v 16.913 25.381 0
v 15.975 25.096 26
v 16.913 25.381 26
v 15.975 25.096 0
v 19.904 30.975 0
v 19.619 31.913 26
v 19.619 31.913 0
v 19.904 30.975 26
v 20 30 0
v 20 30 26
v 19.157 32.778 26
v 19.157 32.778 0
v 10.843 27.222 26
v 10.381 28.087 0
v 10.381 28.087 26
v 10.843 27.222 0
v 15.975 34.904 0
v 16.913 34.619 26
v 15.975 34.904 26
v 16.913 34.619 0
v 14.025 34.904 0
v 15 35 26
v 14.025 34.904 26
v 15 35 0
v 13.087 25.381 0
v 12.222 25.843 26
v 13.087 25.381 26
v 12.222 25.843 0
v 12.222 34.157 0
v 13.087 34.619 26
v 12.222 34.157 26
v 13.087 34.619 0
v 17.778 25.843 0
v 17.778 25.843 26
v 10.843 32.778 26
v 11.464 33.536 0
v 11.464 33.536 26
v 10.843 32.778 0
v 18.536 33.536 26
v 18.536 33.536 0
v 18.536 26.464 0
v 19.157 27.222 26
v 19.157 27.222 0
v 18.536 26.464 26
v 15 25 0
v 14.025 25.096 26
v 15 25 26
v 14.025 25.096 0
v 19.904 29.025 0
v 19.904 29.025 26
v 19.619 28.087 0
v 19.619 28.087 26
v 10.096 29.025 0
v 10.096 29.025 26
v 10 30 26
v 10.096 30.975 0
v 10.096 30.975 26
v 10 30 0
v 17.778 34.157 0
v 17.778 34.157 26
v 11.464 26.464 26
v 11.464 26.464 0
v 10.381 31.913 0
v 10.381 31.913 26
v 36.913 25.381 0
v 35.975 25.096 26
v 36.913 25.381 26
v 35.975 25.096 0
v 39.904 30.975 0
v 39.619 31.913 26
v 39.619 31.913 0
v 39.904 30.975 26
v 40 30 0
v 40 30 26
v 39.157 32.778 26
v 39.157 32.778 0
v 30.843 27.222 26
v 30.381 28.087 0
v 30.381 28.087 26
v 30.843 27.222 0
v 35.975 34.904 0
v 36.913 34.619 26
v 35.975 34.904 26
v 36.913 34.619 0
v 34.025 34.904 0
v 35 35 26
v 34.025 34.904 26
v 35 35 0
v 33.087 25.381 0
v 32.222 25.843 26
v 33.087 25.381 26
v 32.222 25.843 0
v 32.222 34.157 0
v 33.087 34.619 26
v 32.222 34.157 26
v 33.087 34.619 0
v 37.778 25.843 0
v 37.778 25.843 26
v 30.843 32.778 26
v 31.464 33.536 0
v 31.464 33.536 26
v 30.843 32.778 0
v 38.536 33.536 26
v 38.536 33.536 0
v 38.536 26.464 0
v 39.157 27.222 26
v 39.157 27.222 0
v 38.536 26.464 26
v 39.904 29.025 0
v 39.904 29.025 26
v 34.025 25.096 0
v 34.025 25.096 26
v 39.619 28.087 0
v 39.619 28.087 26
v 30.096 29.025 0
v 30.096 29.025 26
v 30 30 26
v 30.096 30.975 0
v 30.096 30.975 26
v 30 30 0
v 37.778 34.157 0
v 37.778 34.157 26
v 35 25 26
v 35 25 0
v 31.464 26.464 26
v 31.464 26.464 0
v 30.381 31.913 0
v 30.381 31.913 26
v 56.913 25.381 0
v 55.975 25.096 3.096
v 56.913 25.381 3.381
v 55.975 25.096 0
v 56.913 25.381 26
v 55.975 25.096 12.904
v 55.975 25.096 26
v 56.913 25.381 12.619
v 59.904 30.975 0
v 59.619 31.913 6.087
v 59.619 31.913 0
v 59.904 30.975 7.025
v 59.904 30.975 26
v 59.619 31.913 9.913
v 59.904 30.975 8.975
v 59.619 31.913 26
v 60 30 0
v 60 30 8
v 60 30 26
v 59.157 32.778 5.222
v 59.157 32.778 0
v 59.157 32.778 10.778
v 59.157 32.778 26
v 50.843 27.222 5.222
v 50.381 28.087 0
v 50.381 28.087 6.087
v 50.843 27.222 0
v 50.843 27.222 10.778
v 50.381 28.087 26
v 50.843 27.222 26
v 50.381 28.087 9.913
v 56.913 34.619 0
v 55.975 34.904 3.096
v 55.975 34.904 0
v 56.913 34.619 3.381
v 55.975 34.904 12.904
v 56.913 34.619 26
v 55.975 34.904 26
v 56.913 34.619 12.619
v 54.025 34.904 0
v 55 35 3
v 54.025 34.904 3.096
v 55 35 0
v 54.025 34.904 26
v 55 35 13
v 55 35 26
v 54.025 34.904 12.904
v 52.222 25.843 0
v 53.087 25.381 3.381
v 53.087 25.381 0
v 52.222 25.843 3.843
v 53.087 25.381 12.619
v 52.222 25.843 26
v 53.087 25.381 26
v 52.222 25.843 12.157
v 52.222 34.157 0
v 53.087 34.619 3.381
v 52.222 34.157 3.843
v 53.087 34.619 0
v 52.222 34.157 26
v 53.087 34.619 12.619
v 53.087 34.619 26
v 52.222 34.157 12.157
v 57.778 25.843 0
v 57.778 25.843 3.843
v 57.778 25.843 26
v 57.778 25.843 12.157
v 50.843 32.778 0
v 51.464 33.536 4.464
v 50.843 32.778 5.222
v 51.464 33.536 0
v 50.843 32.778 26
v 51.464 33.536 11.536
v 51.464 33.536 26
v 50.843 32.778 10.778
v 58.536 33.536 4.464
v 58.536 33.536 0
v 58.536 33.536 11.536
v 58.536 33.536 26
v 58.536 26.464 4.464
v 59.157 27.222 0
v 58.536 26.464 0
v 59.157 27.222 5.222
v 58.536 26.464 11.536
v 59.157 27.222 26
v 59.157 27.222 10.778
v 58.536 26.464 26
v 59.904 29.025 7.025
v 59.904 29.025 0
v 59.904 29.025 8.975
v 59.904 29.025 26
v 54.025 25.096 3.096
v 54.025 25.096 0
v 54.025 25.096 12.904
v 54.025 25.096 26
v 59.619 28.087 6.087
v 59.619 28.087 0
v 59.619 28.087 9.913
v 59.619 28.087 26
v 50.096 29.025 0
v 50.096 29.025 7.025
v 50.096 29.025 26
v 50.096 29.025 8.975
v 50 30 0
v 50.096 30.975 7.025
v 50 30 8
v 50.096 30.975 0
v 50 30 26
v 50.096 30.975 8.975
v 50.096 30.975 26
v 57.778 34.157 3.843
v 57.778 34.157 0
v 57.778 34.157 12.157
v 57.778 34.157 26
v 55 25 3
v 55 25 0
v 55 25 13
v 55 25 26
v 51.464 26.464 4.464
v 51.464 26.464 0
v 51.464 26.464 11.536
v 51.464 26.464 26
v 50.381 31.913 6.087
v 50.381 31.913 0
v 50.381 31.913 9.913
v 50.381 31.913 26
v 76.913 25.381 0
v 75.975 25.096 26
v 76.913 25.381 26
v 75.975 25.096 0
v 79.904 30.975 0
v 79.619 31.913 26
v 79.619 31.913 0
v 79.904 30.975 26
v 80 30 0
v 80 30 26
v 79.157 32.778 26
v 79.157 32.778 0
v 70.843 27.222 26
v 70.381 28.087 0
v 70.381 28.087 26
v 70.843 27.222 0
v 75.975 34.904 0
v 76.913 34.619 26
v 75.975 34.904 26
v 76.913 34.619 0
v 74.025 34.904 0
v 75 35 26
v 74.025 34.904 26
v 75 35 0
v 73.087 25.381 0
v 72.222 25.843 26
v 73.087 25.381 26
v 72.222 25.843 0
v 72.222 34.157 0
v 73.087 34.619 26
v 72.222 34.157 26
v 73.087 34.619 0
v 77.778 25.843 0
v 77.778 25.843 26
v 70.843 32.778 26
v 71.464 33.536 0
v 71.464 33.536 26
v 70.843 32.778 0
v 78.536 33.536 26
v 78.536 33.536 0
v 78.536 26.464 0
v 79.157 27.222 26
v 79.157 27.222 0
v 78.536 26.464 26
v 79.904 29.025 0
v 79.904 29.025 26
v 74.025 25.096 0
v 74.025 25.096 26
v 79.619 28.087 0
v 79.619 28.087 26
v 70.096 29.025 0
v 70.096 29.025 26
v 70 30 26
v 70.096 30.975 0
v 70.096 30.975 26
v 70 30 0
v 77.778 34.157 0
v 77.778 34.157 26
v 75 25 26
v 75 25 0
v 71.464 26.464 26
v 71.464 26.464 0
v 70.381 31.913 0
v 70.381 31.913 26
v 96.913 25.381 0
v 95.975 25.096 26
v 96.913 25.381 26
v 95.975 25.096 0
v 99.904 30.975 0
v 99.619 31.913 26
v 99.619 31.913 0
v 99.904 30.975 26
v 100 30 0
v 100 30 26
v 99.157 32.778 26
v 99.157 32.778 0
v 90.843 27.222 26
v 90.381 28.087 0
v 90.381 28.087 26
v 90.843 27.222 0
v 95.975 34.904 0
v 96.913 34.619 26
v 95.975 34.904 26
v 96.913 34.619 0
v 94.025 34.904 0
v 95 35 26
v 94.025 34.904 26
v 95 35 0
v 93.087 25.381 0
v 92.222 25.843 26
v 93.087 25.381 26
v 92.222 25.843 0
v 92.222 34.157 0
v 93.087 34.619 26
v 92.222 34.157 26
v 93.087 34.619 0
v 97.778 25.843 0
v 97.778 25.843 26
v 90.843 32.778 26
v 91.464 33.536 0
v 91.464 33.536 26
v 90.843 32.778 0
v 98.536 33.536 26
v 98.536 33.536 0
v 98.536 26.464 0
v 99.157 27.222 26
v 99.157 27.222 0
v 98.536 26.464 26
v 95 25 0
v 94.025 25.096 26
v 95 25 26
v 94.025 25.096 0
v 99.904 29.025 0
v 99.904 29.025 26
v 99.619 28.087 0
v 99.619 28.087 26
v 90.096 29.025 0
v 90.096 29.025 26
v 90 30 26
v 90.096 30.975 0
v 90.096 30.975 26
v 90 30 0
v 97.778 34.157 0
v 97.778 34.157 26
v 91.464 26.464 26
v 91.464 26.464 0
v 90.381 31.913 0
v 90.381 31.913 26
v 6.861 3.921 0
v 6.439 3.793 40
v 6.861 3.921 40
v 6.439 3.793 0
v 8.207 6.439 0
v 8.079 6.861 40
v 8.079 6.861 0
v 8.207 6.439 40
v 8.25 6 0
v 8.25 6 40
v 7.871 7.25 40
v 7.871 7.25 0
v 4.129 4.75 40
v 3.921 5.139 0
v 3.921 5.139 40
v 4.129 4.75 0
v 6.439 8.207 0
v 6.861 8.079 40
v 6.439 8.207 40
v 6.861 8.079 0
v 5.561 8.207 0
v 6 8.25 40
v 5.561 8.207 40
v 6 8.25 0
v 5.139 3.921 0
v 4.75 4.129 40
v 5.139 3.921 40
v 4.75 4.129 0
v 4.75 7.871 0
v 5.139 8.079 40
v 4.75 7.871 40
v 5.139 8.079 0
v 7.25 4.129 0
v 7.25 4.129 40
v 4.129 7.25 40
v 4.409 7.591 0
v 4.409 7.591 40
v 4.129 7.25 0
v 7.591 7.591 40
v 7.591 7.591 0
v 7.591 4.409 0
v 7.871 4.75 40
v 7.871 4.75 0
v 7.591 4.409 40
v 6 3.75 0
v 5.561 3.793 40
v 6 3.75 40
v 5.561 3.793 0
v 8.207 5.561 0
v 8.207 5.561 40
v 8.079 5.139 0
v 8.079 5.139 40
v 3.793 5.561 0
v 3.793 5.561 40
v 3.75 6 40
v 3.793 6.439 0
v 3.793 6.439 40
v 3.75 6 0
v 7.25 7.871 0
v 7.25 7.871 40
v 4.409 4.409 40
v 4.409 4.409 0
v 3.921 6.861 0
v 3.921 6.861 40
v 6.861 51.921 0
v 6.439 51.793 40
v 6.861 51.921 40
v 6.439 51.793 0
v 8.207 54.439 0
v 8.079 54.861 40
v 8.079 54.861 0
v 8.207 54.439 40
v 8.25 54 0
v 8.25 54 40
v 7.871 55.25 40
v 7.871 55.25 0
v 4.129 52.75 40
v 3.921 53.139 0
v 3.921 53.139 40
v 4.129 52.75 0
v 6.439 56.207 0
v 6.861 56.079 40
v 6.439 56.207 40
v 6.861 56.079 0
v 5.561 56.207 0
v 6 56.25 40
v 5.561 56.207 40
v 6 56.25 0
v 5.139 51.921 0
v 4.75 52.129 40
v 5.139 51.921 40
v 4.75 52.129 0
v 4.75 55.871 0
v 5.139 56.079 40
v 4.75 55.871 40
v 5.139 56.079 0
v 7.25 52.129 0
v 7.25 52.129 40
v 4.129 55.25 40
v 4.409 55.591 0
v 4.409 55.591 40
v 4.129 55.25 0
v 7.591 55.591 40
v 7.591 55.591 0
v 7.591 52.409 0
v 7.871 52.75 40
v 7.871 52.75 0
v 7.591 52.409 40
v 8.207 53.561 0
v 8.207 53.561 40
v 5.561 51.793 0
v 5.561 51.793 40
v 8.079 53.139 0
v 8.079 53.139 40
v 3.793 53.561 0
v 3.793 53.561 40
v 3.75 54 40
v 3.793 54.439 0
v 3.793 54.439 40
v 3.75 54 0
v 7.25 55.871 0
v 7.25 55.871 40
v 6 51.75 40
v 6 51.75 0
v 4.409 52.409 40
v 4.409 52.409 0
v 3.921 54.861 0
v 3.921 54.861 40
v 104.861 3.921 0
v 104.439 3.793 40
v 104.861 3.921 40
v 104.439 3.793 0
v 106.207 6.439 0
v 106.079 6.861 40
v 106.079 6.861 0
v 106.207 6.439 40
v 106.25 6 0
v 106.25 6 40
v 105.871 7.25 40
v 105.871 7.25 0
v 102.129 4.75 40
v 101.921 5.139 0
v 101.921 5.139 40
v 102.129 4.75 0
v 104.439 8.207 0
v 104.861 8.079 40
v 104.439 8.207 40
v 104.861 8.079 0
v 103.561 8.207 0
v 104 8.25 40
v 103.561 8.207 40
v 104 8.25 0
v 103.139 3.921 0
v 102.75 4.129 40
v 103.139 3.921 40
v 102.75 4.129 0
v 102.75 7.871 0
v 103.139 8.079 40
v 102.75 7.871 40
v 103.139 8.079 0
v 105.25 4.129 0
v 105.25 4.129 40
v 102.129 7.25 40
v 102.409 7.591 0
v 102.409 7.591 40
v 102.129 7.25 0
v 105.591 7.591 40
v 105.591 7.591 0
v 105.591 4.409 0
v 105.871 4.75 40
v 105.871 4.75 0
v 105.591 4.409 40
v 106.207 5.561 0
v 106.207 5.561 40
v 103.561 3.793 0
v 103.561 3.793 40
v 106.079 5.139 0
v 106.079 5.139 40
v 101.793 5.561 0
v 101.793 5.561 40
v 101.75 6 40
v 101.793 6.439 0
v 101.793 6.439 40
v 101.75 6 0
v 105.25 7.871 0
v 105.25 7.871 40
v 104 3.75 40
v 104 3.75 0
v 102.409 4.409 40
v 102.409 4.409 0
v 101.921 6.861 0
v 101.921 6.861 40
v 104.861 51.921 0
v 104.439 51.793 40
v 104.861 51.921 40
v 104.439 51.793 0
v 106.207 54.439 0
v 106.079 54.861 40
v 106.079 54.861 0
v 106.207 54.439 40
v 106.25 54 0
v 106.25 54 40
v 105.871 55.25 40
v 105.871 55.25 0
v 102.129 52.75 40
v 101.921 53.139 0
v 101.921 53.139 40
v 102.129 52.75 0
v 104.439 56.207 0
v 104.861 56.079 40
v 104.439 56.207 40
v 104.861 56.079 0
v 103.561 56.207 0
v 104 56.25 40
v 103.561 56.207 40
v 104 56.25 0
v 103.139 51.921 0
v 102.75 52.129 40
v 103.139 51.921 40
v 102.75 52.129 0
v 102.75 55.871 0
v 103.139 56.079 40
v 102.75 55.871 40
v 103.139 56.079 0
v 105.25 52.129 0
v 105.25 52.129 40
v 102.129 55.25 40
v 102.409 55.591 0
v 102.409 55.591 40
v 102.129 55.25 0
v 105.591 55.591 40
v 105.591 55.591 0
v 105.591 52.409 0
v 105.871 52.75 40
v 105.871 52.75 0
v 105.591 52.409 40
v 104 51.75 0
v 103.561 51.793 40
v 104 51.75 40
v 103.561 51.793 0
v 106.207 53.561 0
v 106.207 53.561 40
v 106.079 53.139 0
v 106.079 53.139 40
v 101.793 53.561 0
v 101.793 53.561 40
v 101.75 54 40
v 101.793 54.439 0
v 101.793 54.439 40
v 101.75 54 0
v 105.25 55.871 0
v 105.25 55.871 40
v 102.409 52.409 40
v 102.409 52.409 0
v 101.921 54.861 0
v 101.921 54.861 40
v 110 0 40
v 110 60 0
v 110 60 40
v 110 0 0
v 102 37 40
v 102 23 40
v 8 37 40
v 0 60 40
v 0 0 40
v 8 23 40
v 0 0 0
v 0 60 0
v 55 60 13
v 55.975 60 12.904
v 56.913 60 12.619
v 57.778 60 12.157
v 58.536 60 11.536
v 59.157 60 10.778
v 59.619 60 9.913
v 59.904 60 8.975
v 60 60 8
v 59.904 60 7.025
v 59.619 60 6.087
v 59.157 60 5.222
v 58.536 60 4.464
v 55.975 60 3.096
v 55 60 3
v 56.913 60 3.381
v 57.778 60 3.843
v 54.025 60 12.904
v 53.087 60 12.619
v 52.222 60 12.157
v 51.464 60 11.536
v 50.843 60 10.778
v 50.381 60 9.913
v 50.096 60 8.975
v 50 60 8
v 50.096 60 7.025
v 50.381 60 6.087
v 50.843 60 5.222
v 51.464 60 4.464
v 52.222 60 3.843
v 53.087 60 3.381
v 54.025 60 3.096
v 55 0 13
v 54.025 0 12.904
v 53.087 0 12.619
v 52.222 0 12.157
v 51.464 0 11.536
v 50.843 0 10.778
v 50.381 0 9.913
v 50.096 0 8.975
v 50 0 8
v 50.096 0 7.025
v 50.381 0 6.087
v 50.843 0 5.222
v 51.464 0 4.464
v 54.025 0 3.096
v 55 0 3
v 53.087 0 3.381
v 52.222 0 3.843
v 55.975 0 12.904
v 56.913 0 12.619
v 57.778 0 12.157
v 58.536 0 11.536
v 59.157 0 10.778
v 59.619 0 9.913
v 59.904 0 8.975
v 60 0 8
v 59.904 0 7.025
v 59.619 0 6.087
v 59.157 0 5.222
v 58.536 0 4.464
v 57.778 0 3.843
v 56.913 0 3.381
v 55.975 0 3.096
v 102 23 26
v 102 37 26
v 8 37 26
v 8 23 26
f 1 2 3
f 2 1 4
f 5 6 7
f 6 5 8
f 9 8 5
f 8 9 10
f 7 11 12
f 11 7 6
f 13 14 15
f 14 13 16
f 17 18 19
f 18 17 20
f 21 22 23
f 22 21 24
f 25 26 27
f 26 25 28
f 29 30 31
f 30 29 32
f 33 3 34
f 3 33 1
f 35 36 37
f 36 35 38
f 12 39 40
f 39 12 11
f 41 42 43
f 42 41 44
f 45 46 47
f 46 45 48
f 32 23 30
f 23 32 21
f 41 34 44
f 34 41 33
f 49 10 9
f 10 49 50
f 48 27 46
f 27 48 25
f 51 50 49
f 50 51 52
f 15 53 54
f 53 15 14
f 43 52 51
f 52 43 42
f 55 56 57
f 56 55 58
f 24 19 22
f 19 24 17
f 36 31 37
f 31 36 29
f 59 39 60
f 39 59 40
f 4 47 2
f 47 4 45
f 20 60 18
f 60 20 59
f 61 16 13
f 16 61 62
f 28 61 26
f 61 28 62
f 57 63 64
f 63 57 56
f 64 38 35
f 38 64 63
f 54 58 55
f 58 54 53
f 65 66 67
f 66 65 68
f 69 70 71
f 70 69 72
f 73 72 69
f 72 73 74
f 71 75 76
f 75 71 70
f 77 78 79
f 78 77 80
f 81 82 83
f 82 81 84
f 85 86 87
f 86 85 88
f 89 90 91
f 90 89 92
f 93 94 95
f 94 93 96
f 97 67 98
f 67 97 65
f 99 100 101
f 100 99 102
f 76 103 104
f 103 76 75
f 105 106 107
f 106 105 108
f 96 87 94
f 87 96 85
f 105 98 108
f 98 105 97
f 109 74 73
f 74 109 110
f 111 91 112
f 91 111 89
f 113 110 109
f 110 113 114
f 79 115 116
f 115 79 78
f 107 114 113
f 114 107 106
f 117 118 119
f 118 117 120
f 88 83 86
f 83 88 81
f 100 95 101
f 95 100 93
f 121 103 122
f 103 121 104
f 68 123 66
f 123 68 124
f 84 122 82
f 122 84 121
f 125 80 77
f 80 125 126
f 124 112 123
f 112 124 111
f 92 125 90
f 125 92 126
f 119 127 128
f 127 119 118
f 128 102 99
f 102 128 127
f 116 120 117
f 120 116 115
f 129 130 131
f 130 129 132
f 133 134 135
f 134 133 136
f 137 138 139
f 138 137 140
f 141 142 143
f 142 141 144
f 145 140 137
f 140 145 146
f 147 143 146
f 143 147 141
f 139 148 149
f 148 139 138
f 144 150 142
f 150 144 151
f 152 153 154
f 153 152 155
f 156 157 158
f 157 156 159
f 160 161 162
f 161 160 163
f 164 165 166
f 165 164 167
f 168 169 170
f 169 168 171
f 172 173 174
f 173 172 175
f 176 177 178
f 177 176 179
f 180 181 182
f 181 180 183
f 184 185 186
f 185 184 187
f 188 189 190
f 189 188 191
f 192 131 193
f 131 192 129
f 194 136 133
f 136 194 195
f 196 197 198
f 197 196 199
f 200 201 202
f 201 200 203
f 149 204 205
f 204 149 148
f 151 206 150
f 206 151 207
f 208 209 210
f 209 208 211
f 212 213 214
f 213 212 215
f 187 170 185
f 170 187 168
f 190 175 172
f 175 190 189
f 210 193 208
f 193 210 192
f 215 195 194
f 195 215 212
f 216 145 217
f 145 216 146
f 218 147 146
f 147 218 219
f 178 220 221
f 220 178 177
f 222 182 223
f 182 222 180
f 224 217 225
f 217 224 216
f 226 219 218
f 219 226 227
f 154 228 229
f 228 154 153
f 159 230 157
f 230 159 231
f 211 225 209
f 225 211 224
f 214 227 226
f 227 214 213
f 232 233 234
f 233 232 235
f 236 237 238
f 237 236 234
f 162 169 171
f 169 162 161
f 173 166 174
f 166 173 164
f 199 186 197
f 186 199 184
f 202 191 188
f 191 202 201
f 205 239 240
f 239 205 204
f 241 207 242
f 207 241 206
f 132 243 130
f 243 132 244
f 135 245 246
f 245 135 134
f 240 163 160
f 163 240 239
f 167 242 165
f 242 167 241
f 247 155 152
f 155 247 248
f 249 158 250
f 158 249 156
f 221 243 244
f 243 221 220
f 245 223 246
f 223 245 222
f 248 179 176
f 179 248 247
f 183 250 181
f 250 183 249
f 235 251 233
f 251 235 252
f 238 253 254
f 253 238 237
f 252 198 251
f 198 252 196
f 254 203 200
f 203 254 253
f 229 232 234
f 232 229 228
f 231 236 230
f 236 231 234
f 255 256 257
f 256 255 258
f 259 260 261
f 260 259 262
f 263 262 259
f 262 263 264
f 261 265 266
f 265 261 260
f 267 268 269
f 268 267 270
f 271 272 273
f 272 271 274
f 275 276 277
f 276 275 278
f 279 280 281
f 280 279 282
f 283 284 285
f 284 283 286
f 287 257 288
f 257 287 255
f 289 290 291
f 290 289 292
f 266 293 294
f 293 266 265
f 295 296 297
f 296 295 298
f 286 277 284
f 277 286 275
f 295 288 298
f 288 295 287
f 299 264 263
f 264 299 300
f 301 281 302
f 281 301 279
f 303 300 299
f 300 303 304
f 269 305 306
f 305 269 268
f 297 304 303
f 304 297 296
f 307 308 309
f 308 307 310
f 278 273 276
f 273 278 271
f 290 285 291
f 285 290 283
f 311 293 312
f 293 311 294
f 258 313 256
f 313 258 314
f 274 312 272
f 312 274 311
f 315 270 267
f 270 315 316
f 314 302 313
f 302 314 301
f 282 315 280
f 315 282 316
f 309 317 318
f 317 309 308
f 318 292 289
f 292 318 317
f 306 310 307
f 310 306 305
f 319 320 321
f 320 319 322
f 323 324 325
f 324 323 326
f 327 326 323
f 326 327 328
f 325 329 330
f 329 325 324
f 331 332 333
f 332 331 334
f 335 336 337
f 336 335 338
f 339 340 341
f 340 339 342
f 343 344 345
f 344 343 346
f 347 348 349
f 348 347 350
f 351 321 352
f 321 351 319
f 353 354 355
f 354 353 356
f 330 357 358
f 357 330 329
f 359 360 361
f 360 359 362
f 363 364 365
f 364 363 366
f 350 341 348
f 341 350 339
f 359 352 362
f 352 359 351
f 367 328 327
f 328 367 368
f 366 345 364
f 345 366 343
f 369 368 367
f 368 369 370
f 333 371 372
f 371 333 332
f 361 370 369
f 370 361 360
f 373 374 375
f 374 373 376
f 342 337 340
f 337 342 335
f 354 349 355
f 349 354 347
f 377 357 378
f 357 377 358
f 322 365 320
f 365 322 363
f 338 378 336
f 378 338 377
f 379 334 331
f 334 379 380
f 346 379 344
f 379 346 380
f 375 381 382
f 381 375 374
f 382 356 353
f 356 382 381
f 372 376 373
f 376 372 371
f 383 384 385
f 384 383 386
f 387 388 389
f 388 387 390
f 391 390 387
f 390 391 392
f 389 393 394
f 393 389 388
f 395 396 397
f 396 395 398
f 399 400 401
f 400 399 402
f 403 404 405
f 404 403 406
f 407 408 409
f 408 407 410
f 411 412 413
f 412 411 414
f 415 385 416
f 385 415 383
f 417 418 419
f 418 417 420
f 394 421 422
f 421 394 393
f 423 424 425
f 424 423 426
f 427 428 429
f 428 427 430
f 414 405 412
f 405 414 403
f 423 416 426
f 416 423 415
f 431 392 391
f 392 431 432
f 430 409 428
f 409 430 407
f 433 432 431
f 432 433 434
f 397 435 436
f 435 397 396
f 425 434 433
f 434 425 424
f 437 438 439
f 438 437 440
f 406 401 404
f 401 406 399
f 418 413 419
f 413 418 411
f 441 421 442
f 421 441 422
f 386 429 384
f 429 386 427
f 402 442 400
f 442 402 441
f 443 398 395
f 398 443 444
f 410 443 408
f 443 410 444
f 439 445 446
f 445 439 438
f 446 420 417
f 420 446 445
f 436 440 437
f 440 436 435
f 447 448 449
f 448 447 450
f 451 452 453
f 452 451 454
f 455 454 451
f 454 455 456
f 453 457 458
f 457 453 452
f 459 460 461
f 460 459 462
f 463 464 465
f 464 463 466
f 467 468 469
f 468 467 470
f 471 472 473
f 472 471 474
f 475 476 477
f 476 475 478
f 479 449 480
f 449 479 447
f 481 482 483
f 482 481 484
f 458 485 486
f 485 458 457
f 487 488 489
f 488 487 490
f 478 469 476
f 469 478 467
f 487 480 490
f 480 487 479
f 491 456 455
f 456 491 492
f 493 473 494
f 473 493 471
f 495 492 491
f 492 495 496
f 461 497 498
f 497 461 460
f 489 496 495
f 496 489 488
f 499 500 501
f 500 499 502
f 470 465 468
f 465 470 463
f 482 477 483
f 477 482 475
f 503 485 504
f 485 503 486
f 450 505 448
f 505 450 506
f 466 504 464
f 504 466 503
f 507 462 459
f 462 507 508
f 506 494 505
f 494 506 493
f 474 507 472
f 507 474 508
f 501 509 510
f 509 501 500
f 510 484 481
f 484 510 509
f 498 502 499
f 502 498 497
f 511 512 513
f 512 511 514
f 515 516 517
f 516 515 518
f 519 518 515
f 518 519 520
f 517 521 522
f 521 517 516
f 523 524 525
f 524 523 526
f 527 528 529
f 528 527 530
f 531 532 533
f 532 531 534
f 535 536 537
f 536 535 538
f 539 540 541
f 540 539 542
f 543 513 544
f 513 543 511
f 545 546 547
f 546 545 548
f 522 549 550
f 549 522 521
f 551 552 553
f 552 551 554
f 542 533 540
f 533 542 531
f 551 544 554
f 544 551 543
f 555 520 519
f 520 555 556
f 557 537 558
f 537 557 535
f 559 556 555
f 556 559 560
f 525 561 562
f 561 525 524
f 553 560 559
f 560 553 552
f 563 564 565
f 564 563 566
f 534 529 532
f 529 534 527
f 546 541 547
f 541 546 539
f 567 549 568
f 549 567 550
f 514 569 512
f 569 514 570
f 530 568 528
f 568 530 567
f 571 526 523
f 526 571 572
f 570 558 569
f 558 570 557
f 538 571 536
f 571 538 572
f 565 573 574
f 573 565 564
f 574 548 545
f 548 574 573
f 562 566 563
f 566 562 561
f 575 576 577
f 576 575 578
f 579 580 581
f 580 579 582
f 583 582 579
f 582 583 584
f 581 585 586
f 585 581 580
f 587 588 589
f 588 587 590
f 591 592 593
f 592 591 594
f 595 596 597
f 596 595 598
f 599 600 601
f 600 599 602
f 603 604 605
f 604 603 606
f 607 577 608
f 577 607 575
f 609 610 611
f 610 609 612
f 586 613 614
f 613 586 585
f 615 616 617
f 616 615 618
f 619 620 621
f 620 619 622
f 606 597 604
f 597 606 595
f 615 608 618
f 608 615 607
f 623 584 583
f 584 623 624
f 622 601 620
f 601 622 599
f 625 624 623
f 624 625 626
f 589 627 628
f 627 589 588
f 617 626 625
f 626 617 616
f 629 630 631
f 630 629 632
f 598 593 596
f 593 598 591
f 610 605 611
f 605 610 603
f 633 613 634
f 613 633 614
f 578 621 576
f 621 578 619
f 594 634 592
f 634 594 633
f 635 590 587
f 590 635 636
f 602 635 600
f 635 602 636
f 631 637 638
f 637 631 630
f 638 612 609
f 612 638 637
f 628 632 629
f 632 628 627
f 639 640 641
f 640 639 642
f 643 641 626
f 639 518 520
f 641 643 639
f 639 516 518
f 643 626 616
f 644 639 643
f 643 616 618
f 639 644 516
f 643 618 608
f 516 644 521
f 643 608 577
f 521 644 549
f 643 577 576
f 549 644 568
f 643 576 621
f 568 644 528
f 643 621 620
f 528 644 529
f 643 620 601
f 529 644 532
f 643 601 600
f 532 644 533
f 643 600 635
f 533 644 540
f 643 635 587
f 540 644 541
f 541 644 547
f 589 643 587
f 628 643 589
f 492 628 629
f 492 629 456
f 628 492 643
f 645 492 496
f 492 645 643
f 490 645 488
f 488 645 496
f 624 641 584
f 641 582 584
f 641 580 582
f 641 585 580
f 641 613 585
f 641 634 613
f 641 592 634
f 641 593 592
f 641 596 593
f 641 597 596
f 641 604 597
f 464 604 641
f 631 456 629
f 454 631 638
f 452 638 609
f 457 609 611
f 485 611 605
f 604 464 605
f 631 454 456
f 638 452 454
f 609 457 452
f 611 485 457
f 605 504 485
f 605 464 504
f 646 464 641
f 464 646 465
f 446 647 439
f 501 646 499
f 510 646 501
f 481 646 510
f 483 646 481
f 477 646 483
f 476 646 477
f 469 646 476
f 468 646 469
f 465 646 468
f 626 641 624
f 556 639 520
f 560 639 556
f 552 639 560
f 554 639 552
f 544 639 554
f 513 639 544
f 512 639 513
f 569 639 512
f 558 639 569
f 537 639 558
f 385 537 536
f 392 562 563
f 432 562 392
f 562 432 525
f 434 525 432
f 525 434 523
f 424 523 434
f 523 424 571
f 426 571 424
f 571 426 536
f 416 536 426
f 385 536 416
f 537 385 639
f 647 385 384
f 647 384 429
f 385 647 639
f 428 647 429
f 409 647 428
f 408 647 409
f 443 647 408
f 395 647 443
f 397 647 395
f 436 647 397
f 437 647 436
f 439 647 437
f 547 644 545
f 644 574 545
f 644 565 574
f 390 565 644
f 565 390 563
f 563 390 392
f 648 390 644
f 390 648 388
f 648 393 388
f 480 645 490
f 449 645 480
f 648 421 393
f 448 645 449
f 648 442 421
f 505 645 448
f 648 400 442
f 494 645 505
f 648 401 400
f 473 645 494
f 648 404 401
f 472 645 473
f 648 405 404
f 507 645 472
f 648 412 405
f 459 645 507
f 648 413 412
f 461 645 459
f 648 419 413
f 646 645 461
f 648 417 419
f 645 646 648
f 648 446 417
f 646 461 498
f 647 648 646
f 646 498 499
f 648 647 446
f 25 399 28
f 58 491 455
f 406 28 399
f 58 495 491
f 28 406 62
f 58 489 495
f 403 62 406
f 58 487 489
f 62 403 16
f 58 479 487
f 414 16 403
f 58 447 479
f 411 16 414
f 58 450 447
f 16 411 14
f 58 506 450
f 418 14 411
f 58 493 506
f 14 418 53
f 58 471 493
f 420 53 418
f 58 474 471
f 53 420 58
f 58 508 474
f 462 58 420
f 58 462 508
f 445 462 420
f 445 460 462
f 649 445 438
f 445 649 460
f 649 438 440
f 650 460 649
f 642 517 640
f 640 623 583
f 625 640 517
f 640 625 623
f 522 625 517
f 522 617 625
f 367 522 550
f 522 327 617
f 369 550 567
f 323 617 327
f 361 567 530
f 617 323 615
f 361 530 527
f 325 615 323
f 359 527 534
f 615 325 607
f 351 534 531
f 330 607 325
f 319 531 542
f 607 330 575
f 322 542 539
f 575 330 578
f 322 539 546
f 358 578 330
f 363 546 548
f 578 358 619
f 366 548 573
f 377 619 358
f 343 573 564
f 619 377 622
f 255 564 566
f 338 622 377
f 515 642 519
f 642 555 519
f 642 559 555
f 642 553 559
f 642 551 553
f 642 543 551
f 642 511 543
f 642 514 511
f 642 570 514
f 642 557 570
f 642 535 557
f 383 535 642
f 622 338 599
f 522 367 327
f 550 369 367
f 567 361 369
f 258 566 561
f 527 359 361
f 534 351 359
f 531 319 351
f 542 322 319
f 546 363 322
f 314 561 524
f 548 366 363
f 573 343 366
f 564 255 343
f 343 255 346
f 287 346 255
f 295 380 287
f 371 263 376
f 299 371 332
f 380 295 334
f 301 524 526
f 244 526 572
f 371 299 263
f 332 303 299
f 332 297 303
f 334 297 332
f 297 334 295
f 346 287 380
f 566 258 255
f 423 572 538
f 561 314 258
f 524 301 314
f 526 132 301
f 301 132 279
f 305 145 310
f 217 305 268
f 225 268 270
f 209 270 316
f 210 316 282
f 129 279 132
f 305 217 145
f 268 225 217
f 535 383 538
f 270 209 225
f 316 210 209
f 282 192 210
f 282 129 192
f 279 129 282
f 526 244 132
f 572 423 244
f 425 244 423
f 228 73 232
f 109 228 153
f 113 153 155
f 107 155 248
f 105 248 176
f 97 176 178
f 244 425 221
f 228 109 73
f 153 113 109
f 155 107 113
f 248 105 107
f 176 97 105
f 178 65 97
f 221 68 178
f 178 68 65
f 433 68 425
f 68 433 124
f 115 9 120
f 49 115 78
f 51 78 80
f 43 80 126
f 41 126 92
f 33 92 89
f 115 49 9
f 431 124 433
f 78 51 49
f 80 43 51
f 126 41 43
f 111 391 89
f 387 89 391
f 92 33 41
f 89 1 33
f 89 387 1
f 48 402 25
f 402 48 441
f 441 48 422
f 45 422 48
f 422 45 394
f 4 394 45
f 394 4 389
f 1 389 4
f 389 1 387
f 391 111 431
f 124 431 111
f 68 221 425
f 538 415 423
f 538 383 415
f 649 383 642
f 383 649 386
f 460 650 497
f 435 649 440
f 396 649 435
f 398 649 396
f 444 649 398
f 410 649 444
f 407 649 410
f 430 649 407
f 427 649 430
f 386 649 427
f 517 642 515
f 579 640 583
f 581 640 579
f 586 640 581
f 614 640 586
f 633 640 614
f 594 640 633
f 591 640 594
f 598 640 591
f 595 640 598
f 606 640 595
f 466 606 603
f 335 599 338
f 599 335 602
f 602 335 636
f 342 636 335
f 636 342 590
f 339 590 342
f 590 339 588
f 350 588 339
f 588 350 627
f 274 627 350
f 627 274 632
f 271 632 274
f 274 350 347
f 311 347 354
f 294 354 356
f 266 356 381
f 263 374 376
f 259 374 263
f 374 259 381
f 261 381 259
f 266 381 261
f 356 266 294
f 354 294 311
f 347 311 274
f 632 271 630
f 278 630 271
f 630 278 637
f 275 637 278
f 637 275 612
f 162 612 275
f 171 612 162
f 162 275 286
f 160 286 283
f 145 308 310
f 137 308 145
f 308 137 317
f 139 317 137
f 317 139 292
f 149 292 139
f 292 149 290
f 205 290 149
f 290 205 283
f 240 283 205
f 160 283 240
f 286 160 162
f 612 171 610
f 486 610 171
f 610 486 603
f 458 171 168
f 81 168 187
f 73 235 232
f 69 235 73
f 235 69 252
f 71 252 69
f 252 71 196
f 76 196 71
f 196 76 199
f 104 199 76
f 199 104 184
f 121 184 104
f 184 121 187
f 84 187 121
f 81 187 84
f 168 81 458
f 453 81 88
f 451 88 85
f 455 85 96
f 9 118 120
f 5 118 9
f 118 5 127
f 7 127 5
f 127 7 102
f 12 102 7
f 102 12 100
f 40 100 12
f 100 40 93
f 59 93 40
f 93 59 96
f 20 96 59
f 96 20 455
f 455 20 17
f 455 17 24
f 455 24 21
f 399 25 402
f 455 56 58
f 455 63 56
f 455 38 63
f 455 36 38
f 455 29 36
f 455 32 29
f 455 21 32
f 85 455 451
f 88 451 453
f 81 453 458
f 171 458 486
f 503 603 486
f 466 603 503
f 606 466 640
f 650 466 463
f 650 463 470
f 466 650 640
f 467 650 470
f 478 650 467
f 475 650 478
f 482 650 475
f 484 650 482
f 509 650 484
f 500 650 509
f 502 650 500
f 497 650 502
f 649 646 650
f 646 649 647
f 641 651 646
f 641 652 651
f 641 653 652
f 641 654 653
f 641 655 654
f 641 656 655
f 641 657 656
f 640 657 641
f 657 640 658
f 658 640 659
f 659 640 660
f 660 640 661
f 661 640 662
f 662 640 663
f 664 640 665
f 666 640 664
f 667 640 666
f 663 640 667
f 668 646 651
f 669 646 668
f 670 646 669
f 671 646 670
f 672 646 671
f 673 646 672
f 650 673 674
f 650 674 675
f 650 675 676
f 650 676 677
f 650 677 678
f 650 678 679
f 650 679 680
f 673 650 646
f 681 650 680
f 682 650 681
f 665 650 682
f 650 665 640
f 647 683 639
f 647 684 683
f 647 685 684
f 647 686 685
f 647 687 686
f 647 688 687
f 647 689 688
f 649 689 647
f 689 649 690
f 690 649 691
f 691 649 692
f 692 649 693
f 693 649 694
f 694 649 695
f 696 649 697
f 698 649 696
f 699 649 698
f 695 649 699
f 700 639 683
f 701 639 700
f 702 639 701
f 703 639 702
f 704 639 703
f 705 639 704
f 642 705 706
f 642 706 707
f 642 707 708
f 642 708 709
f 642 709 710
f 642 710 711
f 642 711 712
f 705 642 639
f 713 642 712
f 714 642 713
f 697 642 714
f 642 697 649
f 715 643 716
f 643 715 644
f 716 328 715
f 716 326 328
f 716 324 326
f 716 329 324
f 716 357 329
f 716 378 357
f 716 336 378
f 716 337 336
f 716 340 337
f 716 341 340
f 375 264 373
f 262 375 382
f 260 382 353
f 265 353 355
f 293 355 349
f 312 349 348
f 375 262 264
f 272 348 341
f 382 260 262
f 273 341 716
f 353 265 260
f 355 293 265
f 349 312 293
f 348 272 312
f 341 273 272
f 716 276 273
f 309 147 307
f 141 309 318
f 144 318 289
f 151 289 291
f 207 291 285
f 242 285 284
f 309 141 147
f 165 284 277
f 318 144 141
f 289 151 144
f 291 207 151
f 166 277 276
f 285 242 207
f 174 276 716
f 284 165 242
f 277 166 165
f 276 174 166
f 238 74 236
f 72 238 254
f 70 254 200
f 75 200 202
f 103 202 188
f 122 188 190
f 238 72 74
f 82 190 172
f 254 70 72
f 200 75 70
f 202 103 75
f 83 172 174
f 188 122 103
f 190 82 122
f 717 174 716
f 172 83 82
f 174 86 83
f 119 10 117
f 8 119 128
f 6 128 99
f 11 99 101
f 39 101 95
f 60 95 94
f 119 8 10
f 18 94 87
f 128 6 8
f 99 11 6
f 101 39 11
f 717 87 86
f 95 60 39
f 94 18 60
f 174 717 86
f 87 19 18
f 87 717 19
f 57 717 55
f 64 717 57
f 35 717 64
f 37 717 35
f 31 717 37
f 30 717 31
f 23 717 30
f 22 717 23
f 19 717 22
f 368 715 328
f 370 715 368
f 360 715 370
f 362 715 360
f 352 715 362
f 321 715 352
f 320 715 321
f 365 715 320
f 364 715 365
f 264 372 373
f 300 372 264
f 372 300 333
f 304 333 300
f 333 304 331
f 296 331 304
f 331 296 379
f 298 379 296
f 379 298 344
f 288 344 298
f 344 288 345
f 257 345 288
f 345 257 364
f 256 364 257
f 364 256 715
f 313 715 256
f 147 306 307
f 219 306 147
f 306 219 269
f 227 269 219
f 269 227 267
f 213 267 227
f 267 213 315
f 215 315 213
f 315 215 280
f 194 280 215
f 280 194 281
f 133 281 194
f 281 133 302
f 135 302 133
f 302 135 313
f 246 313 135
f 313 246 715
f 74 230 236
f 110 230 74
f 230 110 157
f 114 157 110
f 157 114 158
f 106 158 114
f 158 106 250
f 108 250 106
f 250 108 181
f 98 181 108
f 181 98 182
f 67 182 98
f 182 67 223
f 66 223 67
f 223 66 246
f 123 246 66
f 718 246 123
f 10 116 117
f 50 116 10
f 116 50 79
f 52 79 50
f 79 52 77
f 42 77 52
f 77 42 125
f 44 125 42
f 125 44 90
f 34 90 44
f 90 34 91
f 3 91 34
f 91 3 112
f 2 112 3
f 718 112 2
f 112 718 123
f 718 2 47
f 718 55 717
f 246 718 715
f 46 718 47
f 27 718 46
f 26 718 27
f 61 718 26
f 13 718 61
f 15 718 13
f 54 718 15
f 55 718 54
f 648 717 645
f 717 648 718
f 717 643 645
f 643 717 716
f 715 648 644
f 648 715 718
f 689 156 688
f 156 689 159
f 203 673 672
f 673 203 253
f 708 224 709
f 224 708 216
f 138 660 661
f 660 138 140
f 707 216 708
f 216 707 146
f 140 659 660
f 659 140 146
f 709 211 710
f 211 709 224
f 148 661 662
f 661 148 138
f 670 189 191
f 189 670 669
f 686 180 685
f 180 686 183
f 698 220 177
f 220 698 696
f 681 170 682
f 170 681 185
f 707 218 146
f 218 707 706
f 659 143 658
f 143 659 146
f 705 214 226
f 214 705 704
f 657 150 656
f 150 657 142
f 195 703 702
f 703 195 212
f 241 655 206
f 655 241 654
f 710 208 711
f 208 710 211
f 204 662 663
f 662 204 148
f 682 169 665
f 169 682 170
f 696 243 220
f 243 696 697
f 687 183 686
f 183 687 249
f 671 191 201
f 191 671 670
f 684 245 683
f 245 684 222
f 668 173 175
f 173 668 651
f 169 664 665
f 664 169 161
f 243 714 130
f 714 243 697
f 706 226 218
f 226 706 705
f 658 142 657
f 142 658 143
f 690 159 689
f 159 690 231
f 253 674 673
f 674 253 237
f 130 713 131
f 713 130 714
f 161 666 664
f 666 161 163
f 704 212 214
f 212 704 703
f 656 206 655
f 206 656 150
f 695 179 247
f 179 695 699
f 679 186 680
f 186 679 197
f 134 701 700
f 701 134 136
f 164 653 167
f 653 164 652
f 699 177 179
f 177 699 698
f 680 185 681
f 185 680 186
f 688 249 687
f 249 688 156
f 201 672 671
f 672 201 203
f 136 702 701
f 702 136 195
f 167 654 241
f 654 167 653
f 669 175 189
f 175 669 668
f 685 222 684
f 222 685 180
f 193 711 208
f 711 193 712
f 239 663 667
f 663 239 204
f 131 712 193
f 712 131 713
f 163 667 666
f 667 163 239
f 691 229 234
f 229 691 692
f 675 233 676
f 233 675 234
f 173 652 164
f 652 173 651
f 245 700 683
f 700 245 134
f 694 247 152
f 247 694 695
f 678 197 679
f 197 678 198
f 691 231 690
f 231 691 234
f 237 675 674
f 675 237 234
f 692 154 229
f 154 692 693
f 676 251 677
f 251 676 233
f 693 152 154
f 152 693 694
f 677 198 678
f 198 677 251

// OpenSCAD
$fn = 32;

// ----------------------------------------------------------------------
// Manifold block: side_outlet manifold
// ----------------------------------------------------------------------

// --- parameters (mm) ---
block_l = 110;            // block length, X
block_w = 60;             // block width, Y
block_h = 40;             // block height, Z
port_d = 10;              // port bore diameter
port_pitch = 20;          // port pitch along X
gallery_d = 14;           // top gallery width, Y
gallery_depth = 14;       // gallery pocket depth
wall_p = 8;               // gallery end wall thickness, X
mnt_d = 4.5;              // mounting hole diameter
mnt_in = 6;               // mounting hole inset from the edges
out_d = 10;               // outlet bore diameter
out_z = 8;                // outlet axis height

n_ports = 5;  // ports in the row
port_x0 = (block_l - (n_ports - 1) * port_pitch) / 2;  // first port X

difference() {
  cube([block_l, block_w, block_h]);
  for (i = [0 : n_ports - 1])
    translate([port_x0 + i * port_pitch, block_w / 2, -1])
      cylinder(h = block_h + 2, d = port_d);
  translate([wall_p, block_w / 2 - gallery_d / 2, block_h - gallery_depth])
    cube([block_l - 2 * wall_p, gallery_d, gallery_depth + 1]);
  for (cx = [mnt_in, block_l - mnt_in])
    for (cy = [mnt_in, block_w - mnt_in])
      translate([cx, cy, -1]) cylinder(h = block_h + 2, d = mnt_d);
  translate([block_l / 2, -1, out_z]) rotate([-90, 0, 0])
    cylinder(h = block_w + 2, d = out_d);
}
